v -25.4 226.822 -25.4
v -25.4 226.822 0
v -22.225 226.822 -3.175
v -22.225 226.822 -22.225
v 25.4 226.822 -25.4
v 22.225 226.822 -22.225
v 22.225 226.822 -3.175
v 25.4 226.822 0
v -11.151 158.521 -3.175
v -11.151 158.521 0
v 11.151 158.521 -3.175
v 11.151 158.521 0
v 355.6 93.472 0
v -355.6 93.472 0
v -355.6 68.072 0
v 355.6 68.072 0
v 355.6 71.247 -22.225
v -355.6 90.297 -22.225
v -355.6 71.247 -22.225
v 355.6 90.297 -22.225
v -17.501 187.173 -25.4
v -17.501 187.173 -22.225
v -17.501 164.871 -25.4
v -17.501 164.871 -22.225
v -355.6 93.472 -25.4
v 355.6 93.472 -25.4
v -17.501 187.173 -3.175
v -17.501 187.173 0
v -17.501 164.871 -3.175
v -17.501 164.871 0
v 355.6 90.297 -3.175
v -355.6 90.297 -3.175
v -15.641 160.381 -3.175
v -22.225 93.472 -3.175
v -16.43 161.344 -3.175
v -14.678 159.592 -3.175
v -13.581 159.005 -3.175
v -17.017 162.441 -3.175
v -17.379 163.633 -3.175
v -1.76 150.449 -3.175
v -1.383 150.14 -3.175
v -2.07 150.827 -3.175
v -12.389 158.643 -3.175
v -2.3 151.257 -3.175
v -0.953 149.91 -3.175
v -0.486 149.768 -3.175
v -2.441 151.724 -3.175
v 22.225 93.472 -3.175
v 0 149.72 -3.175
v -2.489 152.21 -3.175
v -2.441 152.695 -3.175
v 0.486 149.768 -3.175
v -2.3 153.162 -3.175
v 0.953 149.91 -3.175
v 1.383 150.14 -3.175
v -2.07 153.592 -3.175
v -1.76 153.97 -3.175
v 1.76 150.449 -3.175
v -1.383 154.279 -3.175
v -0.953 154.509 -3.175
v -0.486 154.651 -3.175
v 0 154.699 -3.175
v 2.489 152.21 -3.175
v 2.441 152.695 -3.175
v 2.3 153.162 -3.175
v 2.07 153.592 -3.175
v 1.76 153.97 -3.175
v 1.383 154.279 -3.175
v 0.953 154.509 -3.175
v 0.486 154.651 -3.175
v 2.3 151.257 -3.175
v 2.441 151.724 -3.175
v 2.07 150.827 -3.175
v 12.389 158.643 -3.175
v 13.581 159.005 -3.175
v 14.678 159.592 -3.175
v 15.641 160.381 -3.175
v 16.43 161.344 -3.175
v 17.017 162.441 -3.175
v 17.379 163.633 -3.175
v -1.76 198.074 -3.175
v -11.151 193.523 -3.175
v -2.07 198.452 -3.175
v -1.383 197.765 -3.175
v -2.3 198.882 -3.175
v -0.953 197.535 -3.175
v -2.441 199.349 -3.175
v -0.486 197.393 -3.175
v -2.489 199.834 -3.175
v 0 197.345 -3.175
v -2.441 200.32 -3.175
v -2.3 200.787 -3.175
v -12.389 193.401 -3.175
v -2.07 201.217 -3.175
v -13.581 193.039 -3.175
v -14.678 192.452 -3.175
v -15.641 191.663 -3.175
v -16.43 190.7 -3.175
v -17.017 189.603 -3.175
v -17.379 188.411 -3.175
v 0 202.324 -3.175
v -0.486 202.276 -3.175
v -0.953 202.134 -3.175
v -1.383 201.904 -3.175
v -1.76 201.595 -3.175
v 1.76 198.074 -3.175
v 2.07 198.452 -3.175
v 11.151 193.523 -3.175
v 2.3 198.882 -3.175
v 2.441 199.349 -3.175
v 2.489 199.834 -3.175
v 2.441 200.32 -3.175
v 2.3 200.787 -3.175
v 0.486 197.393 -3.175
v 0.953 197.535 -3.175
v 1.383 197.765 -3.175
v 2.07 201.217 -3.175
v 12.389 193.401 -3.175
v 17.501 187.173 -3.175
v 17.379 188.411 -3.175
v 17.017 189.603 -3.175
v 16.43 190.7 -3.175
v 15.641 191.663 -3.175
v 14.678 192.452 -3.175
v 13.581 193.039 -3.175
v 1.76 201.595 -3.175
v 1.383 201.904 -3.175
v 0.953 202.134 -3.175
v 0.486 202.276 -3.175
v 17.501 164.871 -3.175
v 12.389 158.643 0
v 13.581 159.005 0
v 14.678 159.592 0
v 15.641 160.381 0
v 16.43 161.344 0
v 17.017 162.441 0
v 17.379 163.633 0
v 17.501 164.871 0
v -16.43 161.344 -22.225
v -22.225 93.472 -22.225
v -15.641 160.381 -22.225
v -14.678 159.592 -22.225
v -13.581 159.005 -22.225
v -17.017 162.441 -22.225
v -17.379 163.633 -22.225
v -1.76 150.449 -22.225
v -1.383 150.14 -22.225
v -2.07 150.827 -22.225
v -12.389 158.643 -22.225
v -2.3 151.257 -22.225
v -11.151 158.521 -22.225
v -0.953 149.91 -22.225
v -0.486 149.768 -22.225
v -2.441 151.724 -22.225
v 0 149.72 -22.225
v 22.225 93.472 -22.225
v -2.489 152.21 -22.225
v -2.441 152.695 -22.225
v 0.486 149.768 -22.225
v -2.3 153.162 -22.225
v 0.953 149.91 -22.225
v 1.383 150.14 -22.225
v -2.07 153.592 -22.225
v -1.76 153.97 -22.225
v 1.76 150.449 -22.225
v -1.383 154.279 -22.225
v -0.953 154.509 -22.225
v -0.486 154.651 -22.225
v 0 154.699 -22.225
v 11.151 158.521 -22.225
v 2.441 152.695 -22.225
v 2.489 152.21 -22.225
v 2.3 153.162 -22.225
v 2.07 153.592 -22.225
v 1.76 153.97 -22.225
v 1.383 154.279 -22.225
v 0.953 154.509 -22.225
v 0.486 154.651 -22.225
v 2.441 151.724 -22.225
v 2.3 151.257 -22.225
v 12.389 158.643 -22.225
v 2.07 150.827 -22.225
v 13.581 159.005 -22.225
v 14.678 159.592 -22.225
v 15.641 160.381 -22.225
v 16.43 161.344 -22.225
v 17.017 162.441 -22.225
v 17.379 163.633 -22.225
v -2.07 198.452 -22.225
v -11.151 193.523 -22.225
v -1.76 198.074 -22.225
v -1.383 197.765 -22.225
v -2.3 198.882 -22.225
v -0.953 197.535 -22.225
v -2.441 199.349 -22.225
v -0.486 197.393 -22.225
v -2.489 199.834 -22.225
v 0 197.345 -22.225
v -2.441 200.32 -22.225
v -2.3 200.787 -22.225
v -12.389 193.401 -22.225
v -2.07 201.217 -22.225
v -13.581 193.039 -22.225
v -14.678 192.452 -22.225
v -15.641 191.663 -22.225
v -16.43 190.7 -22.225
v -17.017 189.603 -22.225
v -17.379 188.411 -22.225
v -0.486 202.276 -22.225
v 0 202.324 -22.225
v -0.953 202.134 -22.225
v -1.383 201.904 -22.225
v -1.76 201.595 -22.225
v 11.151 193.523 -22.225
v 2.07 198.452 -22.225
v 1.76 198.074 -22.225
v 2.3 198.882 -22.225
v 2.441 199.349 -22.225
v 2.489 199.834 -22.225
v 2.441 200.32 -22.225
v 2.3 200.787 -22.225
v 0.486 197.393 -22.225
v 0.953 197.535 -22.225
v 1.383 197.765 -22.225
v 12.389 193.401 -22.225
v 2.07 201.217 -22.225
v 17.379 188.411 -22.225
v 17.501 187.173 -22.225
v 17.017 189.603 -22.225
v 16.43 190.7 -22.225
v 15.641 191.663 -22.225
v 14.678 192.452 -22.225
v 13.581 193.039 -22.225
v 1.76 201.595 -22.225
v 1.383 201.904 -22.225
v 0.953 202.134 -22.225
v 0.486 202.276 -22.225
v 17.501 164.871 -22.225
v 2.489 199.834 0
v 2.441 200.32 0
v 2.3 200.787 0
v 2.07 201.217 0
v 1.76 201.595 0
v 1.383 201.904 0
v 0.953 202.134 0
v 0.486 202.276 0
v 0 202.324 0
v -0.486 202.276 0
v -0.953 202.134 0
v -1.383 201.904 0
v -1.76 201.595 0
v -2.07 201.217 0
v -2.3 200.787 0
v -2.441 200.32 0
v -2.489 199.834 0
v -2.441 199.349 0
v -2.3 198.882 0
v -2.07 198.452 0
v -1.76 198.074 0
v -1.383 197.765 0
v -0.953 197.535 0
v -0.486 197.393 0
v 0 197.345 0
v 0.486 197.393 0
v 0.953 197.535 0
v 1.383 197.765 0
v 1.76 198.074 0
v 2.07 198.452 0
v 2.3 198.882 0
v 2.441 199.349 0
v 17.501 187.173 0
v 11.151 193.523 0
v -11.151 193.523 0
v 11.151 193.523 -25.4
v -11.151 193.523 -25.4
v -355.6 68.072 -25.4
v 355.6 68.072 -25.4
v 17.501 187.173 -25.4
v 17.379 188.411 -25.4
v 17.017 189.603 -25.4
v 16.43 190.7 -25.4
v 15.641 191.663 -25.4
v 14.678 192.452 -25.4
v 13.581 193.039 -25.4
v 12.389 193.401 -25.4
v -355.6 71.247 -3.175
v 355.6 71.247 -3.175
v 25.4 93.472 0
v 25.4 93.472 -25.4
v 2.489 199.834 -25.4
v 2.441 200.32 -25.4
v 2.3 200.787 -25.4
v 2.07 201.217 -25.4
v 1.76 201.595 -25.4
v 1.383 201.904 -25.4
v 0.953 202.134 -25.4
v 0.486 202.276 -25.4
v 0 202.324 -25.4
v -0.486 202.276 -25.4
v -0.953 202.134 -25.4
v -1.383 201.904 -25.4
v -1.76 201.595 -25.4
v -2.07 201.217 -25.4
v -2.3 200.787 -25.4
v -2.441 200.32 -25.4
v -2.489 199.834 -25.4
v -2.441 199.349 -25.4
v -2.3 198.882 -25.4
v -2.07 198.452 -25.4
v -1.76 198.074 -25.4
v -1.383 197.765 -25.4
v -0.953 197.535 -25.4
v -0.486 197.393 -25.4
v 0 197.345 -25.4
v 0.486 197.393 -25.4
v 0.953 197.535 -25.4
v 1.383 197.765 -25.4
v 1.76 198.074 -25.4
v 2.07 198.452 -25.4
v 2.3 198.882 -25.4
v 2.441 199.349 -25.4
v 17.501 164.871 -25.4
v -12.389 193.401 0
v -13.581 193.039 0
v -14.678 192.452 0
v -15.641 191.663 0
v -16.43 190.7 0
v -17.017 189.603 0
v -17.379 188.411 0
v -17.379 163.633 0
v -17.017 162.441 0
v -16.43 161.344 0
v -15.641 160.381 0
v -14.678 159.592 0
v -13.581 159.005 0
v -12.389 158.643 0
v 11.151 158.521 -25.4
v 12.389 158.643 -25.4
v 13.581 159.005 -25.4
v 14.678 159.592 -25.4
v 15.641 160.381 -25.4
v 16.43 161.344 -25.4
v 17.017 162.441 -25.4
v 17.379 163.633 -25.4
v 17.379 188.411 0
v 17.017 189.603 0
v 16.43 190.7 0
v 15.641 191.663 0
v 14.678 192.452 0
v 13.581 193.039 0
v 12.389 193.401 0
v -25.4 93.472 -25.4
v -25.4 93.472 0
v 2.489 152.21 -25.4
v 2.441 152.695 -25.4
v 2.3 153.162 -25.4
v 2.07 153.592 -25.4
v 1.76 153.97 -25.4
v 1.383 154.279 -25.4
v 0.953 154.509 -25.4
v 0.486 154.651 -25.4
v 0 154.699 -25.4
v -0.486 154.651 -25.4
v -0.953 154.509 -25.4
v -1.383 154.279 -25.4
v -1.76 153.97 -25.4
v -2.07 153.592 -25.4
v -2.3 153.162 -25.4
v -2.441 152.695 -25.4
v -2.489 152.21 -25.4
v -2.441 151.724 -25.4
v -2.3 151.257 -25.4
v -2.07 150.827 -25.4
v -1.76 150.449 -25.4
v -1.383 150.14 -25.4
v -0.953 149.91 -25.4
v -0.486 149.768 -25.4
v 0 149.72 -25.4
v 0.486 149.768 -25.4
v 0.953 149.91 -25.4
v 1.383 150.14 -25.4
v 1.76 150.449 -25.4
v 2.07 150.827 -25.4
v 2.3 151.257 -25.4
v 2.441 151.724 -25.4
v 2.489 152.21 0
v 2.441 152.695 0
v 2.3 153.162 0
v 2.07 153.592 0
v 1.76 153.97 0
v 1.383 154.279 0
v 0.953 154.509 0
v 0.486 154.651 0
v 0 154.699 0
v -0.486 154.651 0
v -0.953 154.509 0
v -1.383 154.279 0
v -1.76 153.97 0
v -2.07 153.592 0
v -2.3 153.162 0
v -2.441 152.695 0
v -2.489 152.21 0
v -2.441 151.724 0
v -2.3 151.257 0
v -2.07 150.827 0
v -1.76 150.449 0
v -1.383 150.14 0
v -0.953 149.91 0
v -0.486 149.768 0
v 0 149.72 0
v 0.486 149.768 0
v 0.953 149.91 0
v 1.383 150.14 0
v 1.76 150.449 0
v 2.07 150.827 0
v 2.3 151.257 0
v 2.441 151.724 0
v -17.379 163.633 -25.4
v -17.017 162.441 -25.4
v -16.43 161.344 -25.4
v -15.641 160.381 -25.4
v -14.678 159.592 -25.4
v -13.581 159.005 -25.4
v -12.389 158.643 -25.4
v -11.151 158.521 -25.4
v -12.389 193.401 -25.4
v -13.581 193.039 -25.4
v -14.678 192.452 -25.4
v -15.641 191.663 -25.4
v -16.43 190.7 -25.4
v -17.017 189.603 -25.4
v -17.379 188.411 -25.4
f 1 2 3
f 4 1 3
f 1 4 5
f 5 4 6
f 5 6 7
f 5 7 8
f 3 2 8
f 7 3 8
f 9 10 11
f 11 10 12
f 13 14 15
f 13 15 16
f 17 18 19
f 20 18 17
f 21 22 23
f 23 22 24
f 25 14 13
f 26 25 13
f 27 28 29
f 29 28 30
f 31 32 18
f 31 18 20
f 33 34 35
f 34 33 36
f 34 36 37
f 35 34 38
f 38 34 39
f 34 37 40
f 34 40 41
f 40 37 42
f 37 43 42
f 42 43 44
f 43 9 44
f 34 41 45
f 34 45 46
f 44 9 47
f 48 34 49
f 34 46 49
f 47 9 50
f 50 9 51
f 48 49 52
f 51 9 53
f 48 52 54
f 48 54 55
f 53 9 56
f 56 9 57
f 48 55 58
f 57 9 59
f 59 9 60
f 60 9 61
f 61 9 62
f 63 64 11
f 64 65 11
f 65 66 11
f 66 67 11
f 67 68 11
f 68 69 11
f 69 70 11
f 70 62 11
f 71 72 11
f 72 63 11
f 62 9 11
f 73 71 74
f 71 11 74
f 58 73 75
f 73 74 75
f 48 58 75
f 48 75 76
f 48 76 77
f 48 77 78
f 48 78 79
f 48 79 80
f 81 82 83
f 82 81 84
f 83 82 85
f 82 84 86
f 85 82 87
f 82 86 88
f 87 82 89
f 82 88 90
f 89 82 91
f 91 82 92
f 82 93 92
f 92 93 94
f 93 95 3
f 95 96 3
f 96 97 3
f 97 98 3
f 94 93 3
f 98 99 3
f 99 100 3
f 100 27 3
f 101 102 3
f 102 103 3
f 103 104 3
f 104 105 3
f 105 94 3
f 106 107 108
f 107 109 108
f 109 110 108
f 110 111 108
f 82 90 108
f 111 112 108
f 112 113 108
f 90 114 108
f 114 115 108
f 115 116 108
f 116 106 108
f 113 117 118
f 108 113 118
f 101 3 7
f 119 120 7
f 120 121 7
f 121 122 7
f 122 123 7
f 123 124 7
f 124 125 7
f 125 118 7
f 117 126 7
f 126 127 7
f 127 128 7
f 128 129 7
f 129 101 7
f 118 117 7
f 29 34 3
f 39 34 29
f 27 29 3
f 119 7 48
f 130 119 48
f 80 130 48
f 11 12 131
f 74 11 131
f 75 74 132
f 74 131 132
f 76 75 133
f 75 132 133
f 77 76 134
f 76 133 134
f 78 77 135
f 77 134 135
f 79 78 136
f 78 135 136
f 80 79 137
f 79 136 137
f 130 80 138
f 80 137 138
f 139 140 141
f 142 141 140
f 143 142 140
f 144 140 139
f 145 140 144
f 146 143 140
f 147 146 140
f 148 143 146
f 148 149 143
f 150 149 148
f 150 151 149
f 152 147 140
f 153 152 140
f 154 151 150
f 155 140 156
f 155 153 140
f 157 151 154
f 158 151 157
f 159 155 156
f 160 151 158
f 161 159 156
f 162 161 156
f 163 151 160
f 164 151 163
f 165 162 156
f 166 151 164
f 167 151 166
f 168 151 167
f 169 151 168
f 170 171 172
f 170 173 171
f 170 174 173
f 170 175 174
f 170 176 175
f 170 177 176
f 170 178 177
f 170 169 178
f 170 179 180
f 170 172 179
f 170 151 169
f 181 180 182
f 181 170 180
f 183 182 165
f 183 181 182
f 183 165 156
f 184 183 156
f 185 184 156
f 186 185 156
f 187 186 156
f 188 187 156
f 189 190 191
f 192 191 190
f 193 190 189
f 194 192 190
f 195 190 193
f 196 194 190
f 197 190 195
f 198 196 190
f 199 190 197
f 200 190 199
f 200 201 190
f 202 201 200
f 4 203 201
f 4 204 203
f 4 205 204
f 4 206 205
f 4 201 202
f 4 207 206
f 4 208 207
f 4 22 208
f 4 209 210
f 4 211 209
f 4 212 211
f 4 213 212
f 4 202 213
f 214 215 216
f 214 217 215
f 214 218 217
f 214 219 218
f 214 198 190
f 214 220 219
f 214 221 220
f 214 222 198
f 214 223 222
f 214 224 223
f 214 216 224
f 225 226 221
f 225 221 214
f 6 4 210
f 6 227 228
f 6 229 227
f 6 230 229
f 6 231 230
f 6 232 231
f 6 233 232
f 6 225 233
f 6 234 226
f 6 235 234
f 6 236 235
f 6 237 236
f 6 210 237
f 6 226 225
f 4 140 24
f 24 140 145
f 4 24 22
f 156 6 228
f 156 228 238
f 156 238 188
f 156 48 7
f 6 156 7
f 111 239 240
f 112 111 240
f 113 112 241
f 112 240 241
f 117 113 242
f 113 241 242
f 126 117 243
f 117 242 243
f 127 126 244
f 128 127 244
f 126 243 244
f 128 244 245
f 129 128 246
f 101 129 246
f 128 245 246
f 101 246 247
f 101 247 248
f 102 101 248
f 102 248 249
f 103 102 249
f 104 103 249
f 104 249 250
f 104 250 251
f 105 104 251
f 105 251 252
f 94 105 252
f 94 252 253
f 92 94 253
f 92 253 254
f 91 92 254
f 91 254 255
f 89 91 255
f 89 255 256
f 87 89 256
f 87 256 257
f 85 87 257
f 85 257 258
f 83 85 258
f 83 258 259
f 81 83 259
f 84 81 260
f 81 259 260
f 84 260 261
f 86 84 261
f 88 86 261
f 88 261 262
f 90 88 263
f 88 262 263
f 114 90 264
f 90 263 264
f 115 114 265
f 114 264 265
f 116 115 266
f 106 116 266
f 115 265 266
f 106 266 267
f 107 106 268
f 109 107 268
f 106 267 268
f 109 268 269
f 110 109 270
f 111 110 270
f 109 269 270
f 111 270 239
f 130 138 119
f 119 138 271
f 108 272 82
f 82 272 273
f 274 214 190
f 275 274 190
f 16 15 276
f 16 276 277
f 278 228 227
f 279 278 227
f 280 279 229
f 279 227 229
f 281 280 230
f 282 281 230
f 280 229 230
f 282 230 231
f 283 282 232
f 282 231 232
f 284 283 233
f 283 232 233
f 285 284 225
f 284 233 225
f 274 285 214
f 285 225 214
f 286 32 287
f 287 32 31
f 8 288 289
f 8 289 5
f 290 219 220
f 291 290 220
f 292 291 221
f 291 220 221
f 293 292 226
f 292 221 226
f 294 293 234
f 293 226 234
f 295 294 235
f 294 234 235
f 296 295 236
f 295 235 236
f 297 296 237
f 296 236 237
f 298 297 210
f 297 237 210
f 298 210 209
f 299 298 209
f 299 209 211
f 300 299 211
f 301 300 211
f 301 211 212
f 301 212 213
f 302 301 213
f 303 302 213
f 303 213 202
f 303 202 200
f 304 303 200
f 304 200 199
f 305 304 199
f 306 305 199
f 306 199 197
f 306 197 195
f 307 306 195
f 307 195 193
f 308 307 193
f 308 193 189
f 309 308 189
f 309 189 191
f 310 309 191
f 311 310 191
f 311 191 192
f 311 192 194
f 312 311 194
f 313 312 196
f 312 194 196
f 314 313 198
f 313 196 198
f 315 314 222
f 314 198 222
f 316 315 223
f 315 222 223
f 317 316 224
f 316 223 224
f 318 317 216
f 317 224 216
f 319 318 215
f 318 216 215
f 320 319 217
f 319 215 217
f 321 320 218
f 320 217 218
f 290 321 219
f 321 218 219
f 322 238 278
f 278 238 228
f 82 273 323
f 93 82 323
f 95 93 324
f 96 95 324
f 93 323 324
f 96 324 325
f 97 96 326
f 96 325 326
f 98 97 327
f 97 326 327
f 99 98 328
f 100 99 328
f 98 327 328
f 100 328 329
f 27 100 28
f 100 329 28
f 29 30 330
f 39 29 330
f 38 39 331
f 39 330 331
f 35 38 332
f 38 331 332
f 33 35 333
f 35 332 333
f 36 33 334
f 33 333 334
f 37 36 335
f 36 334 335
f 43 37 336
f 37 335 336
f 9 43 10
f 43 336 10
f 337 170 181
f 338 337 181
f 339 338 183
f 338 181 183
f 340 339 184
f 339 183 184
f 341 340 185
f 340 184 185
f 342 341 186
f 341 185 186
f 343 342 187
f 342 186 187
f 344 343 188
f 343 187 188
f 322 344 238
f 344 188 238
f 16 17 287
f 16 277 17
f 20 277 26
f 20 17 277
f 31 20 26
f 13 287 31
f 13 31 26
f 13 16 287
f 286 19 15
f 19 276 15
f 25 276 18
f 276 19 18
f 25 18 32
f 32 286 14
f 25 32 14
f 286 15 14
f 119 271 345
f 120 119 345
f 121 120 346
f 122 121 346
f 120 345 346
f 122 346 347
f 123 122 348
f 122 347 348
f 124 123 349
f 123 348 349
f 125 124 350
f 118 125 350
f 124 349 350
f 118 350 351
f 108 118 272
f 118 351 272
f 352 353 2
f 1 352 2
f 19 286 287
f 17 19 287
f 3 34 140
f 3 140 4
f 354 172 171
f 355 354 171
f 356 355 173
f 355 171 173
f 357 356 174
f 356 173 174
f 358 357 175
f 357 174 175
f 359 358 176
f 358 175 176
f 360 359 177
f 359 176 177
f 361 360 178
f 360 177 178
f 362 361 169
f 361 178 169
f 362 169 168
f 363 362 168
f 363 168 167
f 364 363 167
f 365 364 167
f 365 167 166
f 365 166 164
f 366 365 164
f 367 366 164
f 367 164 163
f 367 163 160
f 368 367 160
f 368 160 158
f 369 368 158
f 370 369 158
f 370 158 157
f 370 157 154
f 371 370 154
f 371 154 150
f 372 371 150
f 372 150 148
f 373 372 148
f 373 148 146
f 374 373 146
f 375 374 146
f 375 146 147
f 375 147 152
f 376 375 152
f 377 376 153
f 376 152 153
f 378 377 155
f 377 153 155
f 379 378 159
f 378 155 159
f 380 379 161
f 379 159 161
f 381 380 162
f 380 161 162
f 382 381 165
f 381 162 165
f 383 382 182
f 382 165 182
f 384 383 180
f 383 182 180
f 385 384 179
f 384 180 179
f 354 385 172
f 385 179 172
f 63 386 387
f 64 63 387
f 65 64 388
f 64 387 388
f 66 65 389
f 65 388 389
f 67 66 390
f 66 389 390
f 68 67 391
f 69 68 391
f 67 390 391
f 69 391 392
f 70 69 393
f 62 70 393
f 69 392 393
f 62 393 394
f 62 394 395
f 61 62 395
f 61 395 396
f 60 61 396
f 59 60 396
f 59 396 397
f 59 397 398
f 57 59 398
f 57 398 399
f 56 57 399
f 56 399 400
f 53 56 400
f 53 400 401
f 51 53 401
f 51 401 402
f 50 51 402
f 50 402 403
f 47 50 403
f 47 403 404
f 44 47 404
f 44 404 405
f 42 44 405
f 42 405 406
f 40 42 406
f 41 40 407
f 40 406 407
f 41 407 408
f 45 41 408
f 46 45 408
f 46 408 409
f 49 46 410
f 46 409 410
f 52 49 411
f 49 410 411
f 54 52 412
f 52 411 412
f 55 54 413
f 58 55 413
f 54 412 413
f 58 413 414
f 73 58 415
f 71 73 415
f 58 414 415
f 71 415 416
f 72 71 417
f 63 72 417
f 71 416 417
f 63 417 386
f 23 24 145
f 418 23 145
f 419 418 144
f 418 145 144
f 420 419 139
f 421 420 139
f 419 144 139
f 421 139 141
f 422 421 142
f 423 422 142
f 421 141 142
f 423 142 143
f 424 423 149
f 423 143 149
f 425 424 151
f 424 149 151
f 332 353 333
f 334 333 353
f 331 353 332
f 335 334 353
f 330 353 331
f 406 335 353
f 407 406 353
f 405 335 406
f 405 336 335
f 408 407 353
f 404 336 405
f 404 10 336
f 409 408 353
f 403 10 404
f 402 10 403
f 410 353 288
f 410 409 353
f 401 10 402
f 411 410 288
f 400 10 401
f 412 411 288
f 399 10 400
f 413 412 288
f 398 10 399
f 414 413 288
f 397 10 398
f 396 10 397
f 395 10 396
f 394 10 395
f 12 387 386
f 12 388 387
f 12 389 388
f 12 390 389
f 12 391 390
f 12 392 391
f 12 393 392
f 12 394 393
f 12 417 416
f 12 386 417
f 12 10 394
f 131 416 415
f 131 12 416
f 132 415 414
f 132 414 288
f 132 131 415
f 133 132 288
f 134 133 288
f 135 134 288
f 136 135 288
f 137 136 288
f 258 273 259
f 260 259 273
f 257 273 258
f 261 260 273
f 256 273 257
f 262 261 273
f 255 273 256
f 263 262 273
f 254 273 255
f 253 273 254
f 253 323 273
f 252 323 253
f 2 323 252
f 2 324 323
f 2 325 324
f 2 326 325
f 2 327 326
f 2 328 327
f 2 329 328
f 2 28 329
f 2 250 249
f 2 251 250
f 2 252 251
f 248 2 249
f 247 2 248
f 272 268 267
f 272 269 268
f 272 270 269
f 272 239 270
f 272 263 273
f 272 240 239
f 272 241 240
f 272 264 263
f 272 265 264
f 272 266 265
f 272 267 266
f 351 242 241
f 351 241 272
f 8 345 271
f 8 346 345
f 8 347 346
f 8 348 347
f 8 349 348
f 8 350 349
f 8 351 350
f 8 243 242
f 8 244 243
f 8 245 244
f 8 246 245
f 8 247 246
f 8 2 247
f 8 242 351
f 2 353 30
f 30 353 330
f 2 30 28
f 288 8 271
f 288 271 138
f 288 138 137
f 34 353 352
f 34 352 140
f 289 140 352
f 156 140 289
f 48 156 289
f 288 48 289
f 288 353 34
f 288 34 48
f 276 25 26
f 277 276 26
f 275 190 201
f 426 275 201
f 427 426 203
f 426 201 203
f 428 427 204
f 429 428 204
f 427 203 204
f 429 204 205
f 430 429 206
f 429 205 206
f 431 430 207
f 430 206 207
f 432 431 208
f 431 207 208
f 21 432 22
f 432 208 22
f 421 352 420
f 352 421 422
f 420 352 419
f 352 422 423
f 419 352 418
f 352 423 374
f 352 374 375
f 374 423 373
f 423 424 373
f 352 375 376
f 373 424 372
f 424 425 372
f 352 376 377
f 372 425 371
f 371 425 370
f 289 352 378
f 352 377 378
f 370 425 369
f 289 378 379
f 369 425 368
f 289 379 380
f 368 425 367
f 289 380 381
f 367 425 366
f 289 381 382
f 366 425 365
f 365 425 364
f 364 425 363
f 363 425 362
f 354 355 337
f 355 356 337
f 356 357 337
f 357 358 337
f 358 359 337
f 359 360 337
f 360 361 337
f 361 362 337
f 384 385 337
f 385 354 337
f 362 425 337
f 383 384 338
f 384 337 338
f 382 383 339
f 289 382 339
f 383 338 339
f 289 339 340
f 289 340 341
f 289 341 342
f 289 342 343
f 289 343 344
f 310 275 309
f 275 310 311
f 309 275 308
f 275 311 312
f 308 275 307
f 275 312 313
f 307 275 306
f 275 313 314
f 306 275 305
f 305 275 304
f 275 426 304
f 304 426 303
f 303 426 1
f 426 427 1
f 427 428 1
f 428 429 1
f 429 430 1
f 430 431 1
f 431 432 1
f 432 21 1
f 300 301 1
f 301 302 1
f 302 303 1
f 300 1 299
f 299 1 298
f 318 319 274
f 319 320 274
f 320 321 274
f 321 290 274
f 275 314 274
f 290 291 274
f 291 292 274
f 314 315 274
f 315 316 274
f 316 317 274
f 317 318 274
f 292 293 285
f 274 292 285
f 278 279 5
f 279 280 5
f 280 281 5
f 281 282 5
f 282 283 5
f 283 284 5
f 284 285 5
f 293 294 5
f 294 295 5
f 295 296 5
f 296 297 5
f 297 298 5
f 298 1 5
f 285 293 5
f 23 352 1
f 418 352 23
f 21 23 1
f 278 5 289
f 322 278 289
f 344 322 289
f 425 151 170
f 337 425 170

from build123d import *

# Parameters (mm, degrees)
CROQUIS5_W              = 711.2
CROQUIS5_H              = 25.4
SALIENTE_EXTRUIR1_DEPTH = 25.4
CROQUIS6_W              = 50.8
CROQUIS6_H              = 133.35
SALIENTE_EXTRUIR2_DEPTH = 25.4
VACIADO1_T              = -3.175
VACIADO2_T              = -3.175
CROQUIS7_R              = 2.4892
CORTAR_EXTRUIR1_DEPTH   = 423.545547467


with BuildPart() as part:
    # Croquis5 → Saliente-Extruir1 (new body)
    with BuildSketch(Plane.XY):
        with Locations((0, 80.772)):
            Rectangle(CROQUIS5_W, CROQUIS5_H)
    extrude(amount=-SALIENTE_EXTRUIR1_DEPTH)

    # Vaciado2
    vaciado2_openings = [part.faces().sort_by_distance(p)[0] for p in [
        (355.6, 80.772, -12.7),
        (-355.6, 80.772, -12.7),
    ]]
    offset(amount=VACIADO2_T, openings=vaciado2_openings, kind=Kind.INTERSECTION)


with BuildPart() as body_2:
    # Croquis6 → Saliente-Extruir2 (new body)
    with BuildSketch(Plane.XY):
        with Locations((0, 160.147)):
            Rectangle(CROQUIS6_W, CROQUIS6_H)
    extrude(amount=-SALIENTE_EXTRUIR2_DEPTH)

    # Vaciado1
    vaciado1_openings = [body_2.faces().sort_by_distance(p)[0] for p in [
        (0, 226.822, -12.7),
        (0, 93.472, -12.7),
    ]]
    offset(amount=VACIADO1_T, openings=vaciado1_openings, kind=Kind.INTERSECTION)

    # Croquis7 → Cortar-Extruir1 (cut, through all)
    with BuildSketch(Plane.XY):
        with Locations((0, 199.8345)):
            Circle(CROQUIS7_R)
        with Locations((0, 152.2095)):
            Circle(CROQUIS7_R)
        with BuildLine():
            Line((-11.1506, 158.5214), (11.1506, 158.5214))
            ThreePointArc((11.1506, 158.5214), (15.640728061, 160.381271939), (17.5006, 164.8714))
            Line((17.5006, 164.8714), (17.5006, 187.1726))
            ThreePointArc((17.5006, 187.1726), (15.640728061, 191.662728061), (11.1506, 193.5226))
            Line((11.1506, 193.5226), (-11.1506, 193.5226))
            ThreePointArc((-11.1506, 193.5226), (-15.640728061, 191.662728061), (-17.5006, 187.1726))
            Line((-17.5006, 187.1726), (-17.5006, 164.8714))
            ThreePointArc((-17.5006, 164.8714), (-15.640728061, 160.381271939), (-11.1506, 158.5214))
        make_face()
    extrude(amount=-CORTAR_EXTRUIR1_DEPTH, mode=Mode.SUBTRACT)


solid = Compound([part.part, body_2.part])
